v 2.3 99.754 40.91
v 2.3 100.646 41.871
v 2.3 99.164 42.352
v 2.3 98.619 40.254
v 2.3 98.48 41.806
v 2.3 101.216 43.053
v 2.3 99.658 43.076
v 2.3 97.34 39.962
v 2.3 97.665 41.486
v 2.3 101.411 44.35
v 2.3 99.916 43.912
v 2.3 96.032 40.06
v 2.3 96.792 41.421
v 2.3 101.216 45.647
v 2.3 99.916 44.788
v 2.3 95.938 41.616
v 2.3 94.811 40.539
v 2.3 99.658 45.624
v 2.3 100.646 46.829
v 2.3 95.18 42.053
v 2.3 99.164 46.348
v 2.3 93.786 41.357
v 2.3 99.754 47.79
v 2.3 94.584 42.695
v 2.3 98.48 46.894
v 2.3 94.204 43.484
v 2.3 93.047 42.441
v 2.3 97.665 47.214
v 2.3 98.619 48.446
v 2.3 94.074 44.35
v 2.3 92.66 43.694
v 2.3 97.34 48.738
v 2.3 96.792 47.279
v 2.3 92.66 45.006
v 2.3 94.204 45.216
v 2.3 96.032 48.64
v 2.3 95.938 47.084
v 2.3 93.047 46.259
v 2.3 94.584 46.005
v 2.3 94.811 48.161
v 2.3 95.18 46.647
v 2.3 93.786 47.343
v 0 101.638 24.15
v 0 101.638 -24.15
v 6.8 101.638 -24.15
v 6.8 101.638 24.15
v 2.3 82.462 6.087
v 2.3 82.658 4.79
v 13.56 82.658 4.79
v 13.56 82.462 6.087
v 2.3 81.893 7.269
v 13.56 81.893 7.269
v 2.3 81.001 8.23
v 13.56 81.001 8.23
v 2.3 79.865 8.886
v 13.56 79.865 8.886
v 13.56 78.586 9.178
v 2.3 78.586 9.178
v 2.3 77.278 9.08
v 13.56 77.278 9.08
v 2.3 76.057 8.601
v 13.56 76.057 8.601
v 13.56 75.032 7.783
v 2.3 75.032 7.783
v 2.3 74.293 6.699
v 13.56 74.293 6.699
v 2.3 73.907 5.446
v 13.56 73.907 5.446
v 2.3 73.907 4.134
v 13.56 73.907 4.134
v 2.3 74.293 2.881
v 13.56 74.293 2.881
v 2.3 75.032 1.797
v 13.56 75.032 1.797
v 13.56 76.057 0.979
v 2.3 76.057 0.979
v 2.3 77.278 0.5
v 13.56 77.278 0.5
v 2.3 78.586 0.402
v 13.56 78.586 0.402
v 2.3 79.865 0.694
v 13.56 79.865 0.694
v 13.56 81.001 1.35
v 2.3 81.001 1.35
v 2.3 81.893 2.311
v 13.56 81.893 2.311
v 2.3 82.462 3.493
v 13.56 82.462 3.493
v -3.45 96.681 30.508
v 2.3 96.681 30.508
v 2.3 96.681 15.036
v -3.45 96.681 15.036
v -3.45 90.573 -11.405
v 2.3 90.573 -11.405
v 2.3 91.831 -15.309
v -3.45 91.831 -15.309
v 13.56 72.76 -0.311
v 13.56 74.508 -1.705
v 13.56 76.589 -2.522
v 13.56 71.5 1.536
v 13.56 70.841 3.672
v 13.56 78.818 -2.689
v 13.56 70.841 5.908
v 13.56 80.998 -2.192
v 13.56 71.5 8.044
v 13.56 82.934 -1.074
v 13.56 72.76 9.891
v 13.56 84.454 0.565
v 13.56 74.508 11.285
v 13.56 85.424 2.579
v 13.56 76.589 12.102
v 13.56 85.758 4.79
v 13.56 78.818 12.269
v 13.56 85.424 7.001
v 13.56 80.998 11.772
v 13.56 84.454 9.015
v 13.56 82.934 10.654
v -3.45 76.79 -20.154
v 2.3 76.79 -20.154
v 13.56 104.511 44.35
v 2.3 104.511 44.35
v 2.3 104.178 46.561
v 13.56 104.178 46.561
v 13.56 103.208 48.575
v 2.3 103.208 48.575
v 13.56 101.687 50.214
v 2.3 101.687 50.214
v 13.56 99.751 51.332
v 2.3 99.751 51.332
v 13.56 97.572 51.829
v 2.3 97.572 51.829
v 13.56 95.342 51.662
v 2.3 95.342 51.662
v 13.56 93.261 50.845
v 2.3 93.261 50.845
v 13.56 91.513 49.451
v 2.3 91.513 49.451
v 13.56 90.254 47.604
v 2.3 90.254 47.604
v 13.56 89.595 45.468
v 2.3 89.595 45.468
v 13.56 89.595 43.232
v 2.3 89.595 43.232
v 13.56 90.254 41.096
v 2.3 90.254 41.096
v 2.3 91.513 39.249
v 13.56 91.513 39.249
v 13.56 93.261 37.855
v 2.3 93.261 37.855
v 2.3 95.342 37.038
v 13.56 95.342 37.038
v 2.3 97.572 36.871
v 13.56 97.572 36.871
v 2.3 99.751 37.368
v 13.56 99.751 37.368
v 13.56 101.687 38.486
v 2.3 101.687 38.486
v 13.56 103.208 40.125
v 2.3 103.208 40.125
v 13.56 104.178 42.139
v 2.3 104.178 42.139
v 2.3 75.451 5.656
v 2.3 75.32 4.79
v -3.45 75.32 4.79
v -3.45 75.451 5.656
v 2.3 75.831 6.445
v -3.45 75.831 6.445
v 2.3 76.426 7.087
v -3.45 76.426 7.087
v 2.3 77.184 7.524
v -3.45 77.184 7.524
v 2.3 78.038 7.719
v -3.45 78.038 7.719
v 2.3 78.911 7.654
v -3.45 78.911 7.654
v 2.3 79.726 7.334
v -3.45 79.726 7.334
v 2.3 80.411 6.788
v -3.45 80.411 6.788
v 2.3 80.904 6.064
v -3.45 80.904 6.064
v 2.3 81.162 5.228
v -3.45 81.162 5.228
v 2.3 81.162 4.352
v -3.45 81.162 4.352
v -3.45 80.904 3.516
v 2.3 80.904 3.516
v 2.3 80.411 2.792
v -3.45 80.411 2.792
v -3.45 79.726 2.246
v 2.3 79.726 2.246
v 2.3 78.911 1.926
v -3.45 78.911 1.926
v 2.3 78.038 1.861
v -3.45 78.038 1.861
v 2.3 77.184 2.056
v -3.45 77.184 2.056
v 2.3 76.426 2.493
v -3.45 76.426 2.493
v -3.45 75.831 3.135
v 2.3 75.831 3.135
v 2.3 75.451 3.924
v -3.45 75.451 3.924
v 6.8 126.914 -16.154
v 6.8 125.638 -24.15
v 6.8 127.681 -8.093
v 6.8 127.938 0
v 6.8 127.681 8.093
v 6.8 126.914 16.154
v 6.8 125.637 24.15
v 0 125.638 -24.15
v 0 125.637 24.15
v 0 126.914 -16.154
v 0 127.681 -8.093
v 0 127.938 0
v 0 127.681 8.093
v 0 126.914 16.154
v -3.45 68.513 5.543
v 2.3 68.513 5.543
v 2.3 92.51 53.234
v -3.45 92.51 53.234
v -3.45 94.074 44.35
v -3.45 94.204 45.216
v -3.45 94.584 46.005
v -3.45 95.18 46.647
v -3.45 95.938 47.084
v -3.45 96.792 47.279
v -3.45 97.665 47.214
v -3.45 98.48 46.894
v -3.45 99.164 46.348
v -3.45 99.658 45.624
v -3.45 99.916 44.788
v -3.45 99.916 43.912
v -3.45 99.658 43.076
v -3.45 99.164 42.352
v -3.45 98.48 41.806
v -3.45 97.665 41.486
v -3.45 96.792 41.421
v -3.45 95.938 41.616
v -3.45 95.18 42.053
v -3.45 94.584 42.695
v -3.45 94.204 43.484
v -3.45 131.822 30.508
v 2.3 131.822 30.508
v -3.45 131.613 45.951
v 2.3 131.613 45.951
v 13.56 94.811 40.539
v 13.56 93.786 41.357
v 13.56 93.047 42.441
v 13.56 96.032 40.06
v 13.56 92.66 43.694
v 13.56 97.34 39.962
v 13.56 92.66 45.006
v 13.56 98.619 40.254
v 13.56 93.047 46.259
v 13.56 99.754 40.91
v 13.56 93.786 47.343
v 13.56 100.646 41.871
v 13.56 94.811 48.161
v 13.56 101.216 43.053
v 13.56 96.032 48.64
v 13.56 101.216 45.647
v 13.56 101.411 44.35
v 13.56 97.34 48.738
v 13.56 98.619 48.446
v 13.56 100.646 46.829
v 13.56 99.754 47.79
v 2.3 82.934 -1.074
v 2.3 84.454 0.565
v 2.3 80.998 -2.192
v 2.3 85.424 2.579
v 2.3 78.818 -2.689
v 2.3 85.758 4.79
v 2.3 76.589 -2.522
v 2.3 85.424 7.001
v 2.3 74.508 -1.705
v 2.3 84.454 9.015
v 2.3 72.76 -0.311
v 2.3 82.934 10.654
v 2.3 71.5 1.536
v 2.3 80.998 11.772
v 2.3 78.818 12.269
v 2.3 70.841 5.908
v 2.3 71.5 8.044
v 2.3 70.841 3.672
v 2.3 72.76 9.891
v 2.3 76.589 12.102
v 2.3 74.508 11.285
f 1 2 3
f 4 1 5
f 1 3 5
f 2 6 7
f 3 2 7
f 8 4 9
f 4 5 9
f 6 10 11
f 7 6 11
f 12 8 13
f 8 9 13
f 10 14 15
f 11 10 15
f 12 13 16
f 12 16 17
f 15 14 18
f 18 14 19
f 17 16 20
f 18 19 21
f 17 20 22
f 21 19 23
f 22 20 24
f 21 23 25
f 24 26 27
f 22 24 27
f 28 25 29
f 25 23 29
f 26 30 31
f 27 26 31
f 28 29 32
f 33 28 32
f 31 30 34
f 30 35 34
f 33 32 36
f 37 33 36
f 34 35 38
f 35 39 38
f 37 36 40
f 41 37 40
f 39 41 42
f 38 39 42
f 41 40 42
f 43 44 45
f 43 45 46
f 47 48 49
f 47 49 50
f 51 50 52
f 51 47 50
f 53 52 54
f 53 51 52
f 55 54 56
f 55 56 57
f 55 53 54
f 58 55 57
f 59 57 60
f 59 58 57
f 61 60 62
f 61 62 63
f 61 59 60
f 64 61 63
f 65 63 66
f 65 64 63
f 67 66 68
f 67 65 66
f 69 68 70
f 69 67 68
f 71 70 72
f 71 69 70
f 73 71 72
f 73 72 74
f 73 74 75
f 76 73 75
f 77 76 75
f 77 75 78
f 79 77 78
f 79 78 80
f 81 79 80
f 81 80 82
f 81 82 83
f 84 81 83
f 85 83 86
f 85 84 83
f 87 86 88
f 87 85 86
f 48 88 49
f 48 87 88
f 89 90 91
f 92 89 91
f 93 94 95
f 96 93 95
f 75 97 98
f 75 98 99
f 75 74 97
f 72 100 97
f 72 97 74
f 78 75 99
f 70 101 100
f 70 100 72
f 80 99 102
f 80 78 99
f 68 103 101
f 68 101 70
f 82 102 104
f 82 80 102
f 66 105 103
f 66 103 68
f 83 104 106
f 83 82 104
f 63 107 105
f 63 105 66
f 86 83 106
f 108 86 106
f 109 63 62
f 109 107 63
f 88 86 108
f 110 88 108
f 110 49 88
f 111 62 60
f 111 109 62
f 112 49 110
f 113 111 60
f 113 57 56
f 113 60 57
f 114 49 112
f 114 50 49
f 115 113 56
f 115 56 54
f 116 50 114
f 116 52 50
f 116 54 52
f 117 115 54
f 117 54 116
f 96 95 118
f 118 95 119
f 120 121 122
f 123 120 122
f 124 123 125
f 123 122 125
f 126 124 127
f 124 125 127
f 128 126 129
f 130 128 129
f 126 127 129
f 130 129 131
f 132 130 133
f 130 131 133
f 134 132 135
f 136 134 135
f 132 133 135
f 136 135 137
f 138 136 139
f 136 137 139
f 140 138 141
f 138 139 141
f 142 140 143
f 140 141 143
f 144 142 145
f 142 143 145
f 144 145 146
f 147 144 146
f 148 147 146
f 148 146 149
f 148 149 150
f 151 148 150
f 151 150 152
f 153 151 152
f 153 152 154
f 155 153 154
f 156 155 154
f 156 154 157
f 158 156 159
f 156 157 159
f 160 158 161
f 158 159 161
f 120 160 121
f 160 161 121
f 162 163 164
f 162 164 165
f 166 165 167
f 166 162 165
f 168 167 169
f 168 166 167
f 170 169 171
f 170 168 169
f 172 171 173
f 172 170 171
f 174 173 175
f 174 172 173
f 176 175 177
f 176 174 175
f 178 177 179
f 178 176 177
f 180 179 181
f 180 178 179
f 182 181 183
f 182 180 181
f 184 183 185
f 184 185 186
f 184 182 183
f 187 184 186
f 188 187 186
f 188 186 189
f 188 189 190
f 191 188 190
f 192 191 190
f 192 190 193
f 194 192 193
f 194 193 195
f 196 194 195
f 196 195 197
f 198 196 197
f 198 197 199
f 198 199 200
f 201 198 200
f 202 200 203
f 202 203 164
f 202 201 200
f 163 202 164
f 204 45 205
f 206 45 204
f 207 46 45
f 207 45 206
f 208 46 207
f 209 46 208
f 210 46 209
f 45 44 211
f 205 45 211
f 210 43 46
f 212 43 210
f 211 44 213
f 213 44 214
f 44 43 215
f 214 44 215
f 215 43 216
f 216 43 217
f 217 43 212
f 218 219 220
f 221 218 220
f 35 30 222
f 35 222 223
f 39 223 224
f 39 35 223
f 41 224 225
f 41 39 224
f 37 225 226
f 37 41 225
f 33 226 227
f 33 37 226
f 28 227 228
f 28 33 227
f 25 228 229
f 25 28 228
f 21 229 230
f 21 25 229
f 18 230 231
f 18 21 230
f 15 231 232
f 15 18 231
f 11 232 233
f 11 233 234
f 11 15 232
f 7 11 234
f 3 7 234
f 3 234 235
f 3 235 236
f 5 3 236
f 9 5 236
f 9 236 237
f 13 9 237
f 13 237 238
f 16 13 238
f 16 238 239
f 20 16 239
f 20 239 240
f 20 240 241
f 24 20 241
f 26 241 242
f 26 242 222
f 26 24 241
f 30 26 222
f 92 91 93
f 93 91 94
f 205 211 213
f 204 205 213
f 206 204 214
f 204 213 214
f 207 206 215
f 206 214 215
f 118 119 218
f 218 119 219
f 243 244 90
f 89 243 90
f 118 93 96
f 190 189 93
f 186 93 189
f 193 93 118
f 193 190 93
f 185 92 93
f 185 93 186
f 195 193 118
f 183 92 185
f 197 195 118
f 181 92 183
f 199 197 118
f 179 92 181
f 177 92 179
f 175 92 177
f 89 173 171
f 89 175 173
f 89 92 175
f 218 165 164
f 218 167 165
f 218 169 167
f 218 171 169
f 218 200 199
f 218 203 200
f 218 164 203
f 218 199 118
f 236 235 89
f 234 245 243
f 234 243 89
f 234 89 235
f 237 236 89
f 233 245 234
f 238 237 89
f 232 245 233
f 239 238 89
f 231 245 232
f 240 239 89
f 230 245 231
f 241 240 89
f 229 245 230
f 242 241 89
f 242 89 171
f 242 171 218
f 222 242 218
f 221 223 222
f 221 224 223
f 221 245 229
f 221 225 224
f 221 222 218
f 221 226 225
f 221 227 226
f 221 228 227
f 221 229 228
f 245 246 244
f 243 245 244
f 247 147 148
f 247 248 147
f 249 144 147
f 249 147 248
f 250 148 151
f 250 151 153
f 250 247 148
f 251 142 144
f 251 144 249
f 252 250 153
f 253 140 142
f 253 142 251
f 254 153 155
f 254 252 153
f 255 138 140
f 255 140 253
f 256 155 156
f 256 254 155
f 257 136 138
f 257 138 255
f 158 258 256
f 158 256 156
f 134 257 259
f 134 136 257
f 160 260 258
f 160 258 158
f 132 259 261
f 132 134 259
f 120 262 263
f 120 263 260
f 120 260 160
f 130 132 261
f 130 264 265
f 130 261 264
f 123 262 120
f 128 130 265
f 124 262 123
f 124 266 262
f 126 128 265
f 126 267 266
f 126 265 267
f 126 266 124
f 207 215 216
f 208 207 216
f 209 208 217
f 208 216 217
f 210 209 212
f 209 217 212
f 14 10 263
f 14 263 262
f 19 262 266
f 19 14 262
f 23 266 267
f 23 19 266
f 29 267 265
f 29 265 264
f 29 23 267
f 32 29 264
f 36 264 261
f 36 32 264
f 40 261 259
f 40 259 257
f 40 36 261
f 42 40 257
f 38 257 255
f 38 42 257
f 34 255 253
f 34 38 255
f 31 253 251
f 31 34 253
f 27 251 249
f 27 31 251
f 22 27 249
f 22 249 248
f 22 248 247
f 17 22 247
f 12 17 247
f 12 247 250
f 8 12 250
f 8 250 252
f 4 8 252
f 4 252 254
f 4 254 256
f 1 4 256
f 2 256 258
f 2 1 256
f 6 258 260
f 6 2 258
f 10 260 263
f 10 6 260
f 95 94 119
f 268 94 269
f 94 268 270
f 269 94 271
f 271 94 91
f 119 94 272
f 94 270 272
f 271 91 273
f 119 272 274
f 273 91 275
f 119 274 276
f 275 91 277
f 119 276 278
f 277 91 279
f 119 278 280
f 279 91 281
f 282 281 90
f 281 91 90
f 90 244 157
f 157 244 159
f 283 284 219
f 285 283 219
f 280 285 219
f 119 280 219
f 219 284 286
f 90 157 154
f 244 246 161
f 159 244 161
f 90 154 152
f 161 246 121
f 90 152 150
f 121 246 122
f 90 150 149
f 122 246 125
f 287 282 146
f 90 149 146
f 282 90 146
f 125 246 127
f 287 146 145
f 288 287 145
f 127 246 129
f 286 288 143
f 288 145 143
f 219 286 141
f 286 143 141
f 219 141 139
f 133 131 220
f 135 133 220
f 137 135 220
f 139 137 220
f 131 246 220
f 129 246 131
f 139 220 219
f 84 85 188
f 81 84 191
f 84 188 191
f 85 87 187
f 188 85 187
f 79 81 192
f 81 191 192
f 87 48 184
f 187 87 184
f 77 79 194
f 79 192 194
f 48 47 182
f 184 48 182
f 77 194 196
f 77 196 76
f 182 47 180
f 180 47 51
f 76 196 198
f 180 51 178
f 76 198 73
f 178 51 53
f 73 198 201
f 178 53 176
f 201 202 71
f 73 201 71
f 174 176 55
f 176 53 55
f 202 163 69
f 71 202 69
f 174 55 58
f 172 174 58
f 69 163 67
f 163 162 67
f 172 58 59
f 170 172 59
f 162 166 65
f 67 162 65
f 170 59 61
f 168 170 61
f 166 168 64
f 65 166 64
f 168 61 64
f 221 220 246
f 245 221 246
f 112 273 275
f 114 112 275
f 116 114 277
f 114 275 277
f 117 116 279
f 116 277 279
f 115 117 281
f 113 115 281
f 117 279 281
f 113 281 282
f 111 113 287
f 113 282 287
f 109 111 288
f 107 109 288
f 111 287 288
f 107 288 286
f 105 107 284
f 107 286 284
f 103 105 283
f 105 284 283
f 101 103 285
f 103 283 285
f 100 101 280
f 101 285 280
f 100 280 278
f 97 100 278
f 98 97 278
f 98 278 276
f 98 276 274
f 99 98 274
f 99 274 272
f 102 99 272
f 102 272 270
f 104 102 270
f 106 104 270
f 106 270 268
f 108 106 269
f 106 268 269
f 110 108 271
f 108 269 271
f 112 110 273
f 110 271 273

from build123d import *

# Parameters (mm, degrees)
F0_W     = 24
F0_H     = 48.3
F1_DEPTH = 6.8
F3_R     = 2.9374057491
F4_DEPTH = 5.75
F5_R     = 7.5
F5_R_2   = 4.4
F6_DEPTH = 11.26


with BuildPart() as f1:
    # F0 (on Right) → F1 (new body)
    with BuildSketch(Plane.YZ):
        with Locations((113.6375, 0)):
            Rectangle(F0_W, F0_H)
        with BuildLine():
            ThreePointArc((127.9375, 0), (127.361202025, 12.1296382881), (125.6375, 24.15))
            Line((125.6375, 24.15), (125.6375, -24.15))
            ThreePointArc((125.6375, -24.15), (127.361202025, -12.1296382881), (127.9375, 0))
        make_face()
    extrude(amount=F1_DEPTH)


with BuildPart() as f4:
    # F3 (on offset) → F4 (new body)
    with BuildSketch(Plane(origin=(2.3, 0, 0), x_dir=(0, -1, 0), z_dir=(-1, 0, 0))):
        Polygon((-92.5102382898, 53.2339587808), (-131.6127759424, 45.9509987215), (-131.8222544034, 30.5078662932), (-96.6812893748, 30.5078662932), (-96.6812893748, 15.0358723477), (-90.5733868189, -11.4052092781), (-91.8309989827, -15.3093019296), (-76.790490761, -20.1542499825), (-68.5127303004, 5.5429758504), align=None)
        with Locations((-78.2575, 4.79)):
            Circle(F3_R, mode=Mode.SUBTRACT)
        with Locations((-97.0110276681, 44.35)):
            Circle(F3_R, mode=Mode.SUBTRACT)
    extrude(amount=F4_DEPTH)

    # F5 (on face) → F6 (join)
    with BuildSketch(Plane.YZ.offset(2.3)):
        with Locations((97.0110276681, 44.35)):
            Circle(F5_R)
        with Locations((97.0110276681, 44.35)):
            Circle(F5_R_2, mode=Mode.SUBTRACT)
        with Locations((78.2575, 4.79)):
            Circle(F5_R)
        with Locations((78.2575, 4.79)):
            Circle(F5_R_2, mode=Mode.SUBTRACT)
    extrude(amount=F6_DEPTH)


solid = Compound([f1.part, f4.part])
